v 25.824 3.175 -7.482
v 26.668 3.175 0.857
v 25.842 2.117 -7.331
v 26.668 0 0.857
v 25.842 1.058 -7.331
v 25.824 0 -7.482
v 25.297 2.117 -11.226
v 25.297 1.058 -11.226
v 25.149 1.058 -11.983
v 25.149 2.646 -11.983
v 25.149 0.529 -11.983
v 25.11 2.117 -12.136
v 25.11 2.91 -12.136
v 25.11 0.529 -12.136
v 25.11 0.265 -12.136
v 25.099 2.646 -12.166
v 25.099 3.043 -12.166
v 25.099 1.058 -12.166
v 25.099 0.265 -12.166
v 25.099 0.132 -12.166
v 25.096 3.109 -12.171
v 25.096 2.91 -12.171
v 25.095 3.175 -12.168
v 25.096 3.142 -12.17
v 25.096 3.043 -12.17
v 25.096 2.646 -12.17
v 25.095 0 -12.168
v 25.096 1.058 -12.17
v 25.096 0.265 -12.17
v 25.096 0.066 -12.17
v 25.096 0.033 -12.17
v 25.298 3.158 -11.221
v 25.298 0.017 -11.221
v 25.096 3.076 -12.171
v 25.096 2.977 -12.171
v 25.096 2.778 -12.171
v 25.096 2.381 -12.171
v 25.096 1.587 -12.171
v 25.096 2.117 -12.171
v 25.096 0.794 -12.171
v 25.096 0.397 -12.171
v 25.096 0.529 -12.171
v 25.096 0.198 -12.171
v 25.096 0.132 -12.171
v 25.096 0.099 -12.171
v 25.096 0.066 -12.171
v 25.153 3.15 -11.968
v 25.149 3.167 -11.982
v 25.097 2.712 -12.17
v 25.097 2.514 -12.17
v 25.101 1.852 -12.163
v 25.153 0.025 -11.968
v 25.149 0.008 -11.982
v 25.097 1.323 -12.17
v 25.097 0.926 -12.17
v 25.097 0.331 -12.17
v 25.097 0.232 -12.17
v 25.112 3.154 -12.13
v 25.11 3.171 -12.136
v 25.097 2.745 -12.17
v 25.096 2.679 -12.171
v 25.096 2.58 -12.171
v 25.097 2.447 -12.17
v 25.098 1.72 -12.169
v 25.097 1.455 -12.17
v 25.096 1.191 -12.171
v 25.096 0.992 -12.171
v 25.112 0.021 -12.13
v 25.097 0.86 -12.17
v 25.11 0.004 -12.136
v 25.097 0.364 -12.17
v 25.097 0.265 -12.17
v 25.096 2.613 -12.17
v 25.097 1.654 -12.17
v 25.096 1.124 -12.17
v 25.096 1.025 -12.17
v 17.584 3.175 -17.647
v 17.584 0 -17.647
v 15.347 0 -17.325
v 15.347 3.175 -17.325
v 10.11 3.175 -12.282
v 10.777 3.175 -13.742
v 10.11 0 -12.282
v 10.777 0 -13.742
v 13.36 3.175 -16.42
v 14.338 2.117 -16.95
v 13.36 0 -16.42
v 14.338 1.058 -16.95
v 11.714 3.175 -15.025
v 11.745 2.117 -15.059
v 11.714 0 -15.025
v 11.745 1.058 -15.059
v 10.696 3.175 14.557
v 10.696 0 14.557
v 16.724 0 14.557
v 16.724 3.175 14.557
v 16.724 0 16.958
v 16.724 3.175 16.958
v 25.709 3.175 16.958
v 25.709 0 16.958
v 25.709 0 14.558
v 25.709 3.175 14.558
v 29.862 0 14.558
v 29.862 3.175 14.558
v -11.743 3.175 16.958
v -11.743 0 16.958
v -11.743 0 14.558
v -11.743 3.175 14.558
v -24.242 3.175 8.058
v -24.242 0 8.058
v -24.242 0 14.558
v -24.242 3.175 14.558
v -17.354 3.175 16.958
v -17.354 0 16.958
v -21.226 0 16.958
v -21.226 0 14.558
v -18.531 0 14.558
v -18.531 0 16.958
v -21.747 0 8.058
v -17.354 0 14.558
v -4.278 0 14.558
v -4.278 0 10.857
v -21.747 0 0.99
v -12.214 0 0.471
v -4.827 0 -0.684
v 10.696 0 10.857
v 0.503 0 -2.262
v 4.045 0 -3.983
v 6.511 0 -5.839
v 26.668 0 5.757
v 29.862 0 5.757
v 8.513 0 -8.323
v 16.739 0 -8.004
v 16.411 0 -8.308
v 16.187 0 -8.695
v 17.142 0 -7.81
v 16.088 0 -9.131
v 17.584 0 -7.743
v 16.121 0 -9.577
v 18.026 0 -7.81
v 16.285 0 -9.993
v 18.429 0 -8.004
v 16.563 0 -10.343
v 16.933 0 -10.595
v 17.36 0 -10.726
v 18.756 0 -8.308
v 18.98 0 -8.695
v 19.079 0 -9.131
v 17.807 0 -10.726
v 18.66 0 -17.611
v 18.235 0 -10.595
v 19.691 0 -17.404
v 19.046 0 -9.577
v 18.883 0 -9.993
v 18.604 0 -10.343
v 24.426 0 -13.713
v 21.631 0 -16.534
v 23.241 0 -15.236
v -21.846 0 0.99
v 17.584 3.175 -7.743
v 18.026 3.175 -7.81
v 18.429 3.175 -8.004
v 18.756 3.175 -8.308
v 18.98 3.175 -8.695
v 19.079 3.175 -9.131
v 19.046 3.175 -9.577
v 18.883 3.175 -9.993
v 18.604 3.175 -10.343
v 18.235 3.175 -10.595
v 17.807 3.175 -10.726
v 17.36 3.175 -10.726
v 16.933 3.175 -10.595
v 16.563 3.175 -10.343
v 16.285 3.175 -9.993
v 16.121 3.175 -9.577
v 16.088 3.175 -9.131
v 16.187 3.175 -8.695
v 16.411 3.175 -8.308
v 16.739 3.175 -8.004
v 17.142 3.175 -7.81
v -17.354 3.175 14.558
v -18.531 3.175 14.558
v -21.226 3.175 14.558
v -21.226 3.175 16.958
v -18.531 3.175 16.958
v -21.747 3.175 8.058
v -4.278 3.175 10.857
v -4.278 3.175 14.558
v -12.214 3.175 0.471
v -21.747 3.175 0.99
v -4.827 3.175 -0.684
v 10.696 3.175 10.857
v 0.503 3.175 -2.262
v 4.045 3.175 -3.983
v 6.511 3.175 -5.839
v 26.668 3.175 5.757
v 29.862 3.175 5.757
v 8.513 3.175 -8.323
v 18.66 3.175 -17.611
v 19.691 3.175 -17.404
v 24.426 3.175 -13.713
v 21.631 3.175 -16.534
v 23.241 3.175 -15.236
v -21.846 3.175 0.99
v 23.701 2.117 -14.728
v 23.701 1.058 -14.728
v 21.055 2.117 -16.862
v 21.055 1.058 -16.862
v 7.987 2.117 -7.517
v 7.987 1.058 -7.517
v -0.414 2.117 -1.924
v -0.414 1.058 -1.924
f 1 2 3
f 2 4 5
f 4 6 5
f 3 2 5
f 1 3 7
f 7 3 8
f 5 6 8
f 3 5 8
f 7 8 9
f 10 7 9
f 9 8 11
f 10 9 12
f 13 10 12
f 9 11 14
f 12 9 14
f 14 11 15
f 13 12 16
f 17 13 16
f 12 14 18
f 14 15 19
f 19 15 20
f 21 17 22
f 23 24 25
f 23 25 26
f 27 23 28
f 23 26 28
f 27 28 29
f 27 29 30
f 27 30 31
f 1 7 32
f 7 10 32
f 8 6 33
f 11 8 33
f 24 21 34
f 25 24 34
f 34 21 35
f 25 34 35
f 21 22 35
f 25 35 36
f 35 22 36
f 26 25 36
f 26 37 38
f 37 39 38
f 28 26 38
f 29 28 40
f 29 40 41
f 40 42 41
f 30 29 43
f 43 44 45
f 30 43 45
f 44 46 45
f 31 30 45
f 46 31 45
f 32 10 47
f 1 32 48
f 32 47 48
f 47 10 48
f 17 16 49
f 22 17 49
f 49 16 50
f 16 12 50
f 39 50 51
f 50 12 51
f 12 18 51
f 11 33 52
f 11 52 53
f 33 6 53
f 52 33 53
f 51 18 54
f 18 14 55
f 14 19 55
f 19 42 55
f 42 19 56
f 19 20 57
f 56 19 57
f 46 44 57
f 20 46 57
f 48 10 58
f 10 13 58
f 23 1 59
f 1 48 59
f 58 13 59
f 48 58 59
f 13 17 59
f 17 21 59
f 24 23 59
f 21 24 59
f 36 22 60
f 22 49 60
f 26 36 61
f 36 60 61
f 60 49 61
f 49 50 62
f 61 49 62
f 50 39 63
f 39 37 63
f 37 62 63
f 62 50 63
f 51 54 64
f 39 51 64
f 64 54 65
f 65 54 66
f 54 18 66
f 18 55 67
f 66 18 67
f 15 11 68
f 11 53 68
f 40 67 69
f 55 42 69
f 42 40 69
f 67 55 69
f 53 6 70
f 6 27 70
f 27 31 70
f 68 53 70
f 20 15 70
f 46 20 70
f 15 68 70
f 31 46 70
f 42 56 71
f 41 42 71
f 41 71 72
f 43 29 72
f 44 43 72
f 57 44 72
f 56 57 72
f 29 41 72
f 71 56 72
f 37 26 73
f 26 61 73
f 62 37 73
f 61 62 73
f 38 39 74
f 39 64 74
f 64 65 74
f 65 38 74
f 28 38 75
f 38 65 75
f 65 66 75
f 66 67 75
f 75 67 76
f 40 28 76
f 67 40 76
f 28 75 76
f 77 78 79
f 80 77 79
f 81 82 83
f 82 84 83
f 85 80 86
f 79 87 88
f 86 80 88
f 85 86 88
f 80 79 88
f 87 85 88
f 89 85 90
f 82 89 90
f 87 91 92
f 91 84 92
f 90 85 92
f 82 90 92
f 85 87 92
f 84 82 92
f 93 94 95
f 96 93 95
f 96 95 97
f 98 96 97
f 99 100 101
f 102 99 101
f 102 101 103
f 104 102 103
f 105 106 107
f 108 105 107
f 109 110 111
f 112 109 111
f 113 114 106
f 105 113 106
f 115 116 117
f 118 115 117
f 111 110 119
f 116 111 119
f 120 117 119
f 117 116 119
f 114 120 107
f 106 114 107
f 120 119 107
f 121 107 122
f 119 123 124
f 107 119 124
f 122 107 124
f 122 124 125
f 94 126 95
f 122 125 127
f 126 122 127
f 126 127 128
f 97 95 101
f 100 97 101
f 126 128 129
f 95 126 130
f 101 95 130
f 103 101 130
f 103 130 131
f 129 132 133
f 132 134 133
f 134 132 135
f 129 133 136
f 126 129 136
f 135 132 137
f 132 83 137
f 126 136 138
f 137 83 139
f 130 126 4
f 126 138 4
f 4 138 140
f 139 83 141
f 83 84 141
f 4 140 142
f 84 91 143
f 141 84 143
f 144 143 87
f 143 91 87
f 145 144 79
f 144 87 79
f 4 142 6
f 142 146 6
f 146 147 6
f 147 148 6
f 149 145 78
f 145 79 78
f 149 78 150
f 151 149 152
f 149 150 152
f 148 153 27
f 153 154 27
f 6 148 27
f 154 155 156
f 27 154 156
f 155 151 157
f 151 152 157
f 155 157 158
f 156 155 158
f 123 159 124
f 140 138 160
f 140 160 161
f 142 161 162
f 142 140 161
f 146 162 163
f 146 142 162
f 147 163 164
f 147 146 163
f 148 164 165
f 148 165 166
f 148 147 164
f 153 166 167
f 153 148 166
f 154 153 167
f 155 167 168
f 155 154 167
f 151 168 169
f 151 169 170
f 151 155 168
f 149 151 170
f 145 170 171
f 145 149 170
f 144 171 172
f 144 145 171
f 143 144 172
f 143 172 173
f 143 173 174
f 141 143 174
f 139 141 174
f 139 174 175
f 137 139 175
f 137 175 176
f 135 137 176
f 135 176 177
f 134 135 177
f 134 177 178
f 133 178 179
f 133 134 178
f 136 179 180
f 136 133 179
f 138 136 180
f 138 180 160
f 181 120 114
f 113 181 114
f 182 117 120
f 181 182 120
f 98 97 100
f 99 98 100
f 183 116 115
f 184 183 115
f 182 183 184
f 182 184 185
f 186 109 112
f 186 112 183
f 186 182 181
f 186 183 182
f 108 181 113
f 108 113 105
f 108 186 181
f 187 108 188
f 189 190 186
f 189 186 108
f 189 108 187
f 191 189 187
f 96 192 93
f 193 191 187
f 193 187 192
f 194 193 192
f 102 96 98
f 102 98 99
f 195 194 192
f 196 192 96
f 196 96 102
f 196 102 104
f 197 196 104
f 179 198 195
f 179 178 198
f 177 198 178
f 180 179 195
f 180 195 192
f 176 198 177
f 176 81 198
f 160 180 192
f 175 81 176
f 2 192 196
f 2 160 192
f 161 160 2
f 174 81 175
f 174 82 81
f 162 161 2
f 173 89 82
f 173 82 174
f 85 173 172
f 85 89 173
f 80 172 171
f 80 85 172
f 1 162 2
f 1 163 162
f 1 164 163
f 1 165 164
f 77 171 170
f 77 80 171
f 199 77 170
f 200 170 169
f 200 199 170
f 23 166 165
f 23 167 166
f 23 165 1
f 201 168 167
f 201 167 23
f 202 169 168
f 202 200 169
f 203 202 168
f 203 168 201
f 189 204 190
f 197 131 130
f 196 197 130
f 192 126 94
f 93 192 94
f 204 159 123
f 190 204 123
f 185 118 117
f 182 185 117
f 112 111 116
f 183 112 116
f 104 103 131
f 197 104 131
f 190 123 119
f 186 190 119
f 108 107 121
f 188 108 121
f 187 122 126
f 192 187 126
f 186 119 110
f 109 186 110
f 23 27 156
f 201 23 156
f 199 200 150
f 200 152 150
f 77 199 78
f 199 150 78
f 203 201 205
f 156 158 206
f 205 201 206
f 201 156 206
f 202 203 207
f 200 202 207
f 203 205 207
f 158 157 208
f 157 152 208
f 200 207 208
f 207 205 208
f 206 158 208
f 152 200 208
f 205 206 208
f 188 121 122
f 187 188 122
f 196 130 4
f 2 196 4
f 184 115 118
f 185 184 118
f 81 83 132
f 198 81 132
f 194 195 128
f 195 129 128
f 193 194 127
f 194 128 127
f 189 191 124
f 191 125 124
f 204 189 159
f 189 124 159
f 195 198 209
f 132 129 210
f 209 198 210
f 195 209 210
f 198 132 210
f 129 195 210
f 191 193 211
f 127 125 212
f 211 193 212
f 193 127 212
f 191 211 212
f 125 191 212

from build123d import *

# Parameters (mm, degrees)
SKETCH1_R           = 1.499976783
BOSS_EXTRUDE1_DEPTH = 3.175


with BuildPart() as part:
    # Sketch1 → Boss-Extrude1 (new body)
    with BuildSketch(Plane(origin=(0, 0, 0), x_dir=(1, 0, 0), z_dir=(0, 1, 0))):
        with BuildLine():
            Line((29.861952869, -5.757321993), (26.667645588, -5.757321993))
            Line((26.667645588, -5.757321993), (26.667645588, -0.857080759))
            add(Edge.make_bspline(
                [(26.667645588, -0.857080759), (25.72356302, 9.922922576), (25.103649505, 12.257419962), (25.095153567, 12.168136444)],
                knots=[3, 3, 3, 3, 4, 4, 4, 4], degree=3))
            add(Edge.make_bspline(
                [(25.095153567, 12.168136444), (24.467255917, 14.632886979), (21.327316795, 17.843284785), (17.583634713, 17.647304435)],
                knots=[4, 4, 4, 4, 5, 5, 5, 5], degree=3))
            add(Edge.make_bspline(
                [(17.583634713, 17.647304435), (14.112817036, 17.647304435), (11.16518444, 15.401572953), (10.109869901, 12.281874779)],
                knots=[5, 5, 5, 5, 6, 6, 6, 6], degree=3))
            add(Edge.make_bspline(
                [(10.109869901, 12.281874779), (8.875160908, 9.099252332), (8.353569729, -0.584552145), (-21.846222224, -0.989511791)],
                knots=[6, 6, 6, 6, 7, 7, 7, 7], degree=3))
            Line((-21.846222224, -0.989511791), (-21.74662038, -0.989511791))
            Line((-21.74662038, -0.989511791), (-21.74662038, -8.05752013))
            Line((-21.74662038, -8.05752013), (-24.242242708, -8.05752013))
            Line((-24.242242708, -8.05752013), (-24.242242708, -14.557549737))
            Line((-24.242242708, -14.557549737), (-21.225926076, -14.557549737))
            Line((-21.225926076, -14.557549737), (-21.225926076, -16.957715728))
            Line((-21.225926076, -16.957715728), (-18.530788103, -16.957715728))
            Line((-18.530788103, -16.957715728), (-18.530788103, -14.557549737))
            Line((-18.530788103, -14.557549737), (-17.354341851, -14.557549737))
            Line((-17.354341851, -14.557549737), (-17.354341851, -16.957715728))
            Line((-17.354341851, -16.957715728), (-11.742742556, -16.957715728))
            Line((-11.742742556, -16.957715728), (-11.742742556, -14.557549737))
            Line((-11.742742556, -14.557549737), (-4.290380881, -14.557549737))
            Line((-4.290380881, -14.557549737), (-4.277541923, -14.557549737))
            Line((-4.277541923, -14.557549737), (-4.277541923, -10.857323134))
            Line((-4.277541923, -10.857323134), (10.695923955, -10.857323134))
            Line((10.695923955, -10.857323134), (10.695923955, -14.557422775))
            Line((10.695923955, -14.557422775), (16.724267817, -14.557422775))
            Line((16.724267817, -14.557422775), (16.724267817, -16.957715728))
            Line((16.724267817, -16.957715728), (25.708547678, -16.957715728))
            Line((25.708547678, -16.957715728), (25.708547678, -14.557549737))
            Line((25.708547678, -14.557549737), (29.861952869, -14.557549737))
            Line((29.861952869, -14.557549737), (29.861952869, -5.757321993))
        make_face()
        with Locations(Location((17.58369808, 9.243227132, 0), (0, 0, 270))):
            Circle(SKETCH1_R, mode=Mode.SUBTRACT)
    extrude(amount=BOSS_EXTRUDE1_DEPTH)


solid = part.part
